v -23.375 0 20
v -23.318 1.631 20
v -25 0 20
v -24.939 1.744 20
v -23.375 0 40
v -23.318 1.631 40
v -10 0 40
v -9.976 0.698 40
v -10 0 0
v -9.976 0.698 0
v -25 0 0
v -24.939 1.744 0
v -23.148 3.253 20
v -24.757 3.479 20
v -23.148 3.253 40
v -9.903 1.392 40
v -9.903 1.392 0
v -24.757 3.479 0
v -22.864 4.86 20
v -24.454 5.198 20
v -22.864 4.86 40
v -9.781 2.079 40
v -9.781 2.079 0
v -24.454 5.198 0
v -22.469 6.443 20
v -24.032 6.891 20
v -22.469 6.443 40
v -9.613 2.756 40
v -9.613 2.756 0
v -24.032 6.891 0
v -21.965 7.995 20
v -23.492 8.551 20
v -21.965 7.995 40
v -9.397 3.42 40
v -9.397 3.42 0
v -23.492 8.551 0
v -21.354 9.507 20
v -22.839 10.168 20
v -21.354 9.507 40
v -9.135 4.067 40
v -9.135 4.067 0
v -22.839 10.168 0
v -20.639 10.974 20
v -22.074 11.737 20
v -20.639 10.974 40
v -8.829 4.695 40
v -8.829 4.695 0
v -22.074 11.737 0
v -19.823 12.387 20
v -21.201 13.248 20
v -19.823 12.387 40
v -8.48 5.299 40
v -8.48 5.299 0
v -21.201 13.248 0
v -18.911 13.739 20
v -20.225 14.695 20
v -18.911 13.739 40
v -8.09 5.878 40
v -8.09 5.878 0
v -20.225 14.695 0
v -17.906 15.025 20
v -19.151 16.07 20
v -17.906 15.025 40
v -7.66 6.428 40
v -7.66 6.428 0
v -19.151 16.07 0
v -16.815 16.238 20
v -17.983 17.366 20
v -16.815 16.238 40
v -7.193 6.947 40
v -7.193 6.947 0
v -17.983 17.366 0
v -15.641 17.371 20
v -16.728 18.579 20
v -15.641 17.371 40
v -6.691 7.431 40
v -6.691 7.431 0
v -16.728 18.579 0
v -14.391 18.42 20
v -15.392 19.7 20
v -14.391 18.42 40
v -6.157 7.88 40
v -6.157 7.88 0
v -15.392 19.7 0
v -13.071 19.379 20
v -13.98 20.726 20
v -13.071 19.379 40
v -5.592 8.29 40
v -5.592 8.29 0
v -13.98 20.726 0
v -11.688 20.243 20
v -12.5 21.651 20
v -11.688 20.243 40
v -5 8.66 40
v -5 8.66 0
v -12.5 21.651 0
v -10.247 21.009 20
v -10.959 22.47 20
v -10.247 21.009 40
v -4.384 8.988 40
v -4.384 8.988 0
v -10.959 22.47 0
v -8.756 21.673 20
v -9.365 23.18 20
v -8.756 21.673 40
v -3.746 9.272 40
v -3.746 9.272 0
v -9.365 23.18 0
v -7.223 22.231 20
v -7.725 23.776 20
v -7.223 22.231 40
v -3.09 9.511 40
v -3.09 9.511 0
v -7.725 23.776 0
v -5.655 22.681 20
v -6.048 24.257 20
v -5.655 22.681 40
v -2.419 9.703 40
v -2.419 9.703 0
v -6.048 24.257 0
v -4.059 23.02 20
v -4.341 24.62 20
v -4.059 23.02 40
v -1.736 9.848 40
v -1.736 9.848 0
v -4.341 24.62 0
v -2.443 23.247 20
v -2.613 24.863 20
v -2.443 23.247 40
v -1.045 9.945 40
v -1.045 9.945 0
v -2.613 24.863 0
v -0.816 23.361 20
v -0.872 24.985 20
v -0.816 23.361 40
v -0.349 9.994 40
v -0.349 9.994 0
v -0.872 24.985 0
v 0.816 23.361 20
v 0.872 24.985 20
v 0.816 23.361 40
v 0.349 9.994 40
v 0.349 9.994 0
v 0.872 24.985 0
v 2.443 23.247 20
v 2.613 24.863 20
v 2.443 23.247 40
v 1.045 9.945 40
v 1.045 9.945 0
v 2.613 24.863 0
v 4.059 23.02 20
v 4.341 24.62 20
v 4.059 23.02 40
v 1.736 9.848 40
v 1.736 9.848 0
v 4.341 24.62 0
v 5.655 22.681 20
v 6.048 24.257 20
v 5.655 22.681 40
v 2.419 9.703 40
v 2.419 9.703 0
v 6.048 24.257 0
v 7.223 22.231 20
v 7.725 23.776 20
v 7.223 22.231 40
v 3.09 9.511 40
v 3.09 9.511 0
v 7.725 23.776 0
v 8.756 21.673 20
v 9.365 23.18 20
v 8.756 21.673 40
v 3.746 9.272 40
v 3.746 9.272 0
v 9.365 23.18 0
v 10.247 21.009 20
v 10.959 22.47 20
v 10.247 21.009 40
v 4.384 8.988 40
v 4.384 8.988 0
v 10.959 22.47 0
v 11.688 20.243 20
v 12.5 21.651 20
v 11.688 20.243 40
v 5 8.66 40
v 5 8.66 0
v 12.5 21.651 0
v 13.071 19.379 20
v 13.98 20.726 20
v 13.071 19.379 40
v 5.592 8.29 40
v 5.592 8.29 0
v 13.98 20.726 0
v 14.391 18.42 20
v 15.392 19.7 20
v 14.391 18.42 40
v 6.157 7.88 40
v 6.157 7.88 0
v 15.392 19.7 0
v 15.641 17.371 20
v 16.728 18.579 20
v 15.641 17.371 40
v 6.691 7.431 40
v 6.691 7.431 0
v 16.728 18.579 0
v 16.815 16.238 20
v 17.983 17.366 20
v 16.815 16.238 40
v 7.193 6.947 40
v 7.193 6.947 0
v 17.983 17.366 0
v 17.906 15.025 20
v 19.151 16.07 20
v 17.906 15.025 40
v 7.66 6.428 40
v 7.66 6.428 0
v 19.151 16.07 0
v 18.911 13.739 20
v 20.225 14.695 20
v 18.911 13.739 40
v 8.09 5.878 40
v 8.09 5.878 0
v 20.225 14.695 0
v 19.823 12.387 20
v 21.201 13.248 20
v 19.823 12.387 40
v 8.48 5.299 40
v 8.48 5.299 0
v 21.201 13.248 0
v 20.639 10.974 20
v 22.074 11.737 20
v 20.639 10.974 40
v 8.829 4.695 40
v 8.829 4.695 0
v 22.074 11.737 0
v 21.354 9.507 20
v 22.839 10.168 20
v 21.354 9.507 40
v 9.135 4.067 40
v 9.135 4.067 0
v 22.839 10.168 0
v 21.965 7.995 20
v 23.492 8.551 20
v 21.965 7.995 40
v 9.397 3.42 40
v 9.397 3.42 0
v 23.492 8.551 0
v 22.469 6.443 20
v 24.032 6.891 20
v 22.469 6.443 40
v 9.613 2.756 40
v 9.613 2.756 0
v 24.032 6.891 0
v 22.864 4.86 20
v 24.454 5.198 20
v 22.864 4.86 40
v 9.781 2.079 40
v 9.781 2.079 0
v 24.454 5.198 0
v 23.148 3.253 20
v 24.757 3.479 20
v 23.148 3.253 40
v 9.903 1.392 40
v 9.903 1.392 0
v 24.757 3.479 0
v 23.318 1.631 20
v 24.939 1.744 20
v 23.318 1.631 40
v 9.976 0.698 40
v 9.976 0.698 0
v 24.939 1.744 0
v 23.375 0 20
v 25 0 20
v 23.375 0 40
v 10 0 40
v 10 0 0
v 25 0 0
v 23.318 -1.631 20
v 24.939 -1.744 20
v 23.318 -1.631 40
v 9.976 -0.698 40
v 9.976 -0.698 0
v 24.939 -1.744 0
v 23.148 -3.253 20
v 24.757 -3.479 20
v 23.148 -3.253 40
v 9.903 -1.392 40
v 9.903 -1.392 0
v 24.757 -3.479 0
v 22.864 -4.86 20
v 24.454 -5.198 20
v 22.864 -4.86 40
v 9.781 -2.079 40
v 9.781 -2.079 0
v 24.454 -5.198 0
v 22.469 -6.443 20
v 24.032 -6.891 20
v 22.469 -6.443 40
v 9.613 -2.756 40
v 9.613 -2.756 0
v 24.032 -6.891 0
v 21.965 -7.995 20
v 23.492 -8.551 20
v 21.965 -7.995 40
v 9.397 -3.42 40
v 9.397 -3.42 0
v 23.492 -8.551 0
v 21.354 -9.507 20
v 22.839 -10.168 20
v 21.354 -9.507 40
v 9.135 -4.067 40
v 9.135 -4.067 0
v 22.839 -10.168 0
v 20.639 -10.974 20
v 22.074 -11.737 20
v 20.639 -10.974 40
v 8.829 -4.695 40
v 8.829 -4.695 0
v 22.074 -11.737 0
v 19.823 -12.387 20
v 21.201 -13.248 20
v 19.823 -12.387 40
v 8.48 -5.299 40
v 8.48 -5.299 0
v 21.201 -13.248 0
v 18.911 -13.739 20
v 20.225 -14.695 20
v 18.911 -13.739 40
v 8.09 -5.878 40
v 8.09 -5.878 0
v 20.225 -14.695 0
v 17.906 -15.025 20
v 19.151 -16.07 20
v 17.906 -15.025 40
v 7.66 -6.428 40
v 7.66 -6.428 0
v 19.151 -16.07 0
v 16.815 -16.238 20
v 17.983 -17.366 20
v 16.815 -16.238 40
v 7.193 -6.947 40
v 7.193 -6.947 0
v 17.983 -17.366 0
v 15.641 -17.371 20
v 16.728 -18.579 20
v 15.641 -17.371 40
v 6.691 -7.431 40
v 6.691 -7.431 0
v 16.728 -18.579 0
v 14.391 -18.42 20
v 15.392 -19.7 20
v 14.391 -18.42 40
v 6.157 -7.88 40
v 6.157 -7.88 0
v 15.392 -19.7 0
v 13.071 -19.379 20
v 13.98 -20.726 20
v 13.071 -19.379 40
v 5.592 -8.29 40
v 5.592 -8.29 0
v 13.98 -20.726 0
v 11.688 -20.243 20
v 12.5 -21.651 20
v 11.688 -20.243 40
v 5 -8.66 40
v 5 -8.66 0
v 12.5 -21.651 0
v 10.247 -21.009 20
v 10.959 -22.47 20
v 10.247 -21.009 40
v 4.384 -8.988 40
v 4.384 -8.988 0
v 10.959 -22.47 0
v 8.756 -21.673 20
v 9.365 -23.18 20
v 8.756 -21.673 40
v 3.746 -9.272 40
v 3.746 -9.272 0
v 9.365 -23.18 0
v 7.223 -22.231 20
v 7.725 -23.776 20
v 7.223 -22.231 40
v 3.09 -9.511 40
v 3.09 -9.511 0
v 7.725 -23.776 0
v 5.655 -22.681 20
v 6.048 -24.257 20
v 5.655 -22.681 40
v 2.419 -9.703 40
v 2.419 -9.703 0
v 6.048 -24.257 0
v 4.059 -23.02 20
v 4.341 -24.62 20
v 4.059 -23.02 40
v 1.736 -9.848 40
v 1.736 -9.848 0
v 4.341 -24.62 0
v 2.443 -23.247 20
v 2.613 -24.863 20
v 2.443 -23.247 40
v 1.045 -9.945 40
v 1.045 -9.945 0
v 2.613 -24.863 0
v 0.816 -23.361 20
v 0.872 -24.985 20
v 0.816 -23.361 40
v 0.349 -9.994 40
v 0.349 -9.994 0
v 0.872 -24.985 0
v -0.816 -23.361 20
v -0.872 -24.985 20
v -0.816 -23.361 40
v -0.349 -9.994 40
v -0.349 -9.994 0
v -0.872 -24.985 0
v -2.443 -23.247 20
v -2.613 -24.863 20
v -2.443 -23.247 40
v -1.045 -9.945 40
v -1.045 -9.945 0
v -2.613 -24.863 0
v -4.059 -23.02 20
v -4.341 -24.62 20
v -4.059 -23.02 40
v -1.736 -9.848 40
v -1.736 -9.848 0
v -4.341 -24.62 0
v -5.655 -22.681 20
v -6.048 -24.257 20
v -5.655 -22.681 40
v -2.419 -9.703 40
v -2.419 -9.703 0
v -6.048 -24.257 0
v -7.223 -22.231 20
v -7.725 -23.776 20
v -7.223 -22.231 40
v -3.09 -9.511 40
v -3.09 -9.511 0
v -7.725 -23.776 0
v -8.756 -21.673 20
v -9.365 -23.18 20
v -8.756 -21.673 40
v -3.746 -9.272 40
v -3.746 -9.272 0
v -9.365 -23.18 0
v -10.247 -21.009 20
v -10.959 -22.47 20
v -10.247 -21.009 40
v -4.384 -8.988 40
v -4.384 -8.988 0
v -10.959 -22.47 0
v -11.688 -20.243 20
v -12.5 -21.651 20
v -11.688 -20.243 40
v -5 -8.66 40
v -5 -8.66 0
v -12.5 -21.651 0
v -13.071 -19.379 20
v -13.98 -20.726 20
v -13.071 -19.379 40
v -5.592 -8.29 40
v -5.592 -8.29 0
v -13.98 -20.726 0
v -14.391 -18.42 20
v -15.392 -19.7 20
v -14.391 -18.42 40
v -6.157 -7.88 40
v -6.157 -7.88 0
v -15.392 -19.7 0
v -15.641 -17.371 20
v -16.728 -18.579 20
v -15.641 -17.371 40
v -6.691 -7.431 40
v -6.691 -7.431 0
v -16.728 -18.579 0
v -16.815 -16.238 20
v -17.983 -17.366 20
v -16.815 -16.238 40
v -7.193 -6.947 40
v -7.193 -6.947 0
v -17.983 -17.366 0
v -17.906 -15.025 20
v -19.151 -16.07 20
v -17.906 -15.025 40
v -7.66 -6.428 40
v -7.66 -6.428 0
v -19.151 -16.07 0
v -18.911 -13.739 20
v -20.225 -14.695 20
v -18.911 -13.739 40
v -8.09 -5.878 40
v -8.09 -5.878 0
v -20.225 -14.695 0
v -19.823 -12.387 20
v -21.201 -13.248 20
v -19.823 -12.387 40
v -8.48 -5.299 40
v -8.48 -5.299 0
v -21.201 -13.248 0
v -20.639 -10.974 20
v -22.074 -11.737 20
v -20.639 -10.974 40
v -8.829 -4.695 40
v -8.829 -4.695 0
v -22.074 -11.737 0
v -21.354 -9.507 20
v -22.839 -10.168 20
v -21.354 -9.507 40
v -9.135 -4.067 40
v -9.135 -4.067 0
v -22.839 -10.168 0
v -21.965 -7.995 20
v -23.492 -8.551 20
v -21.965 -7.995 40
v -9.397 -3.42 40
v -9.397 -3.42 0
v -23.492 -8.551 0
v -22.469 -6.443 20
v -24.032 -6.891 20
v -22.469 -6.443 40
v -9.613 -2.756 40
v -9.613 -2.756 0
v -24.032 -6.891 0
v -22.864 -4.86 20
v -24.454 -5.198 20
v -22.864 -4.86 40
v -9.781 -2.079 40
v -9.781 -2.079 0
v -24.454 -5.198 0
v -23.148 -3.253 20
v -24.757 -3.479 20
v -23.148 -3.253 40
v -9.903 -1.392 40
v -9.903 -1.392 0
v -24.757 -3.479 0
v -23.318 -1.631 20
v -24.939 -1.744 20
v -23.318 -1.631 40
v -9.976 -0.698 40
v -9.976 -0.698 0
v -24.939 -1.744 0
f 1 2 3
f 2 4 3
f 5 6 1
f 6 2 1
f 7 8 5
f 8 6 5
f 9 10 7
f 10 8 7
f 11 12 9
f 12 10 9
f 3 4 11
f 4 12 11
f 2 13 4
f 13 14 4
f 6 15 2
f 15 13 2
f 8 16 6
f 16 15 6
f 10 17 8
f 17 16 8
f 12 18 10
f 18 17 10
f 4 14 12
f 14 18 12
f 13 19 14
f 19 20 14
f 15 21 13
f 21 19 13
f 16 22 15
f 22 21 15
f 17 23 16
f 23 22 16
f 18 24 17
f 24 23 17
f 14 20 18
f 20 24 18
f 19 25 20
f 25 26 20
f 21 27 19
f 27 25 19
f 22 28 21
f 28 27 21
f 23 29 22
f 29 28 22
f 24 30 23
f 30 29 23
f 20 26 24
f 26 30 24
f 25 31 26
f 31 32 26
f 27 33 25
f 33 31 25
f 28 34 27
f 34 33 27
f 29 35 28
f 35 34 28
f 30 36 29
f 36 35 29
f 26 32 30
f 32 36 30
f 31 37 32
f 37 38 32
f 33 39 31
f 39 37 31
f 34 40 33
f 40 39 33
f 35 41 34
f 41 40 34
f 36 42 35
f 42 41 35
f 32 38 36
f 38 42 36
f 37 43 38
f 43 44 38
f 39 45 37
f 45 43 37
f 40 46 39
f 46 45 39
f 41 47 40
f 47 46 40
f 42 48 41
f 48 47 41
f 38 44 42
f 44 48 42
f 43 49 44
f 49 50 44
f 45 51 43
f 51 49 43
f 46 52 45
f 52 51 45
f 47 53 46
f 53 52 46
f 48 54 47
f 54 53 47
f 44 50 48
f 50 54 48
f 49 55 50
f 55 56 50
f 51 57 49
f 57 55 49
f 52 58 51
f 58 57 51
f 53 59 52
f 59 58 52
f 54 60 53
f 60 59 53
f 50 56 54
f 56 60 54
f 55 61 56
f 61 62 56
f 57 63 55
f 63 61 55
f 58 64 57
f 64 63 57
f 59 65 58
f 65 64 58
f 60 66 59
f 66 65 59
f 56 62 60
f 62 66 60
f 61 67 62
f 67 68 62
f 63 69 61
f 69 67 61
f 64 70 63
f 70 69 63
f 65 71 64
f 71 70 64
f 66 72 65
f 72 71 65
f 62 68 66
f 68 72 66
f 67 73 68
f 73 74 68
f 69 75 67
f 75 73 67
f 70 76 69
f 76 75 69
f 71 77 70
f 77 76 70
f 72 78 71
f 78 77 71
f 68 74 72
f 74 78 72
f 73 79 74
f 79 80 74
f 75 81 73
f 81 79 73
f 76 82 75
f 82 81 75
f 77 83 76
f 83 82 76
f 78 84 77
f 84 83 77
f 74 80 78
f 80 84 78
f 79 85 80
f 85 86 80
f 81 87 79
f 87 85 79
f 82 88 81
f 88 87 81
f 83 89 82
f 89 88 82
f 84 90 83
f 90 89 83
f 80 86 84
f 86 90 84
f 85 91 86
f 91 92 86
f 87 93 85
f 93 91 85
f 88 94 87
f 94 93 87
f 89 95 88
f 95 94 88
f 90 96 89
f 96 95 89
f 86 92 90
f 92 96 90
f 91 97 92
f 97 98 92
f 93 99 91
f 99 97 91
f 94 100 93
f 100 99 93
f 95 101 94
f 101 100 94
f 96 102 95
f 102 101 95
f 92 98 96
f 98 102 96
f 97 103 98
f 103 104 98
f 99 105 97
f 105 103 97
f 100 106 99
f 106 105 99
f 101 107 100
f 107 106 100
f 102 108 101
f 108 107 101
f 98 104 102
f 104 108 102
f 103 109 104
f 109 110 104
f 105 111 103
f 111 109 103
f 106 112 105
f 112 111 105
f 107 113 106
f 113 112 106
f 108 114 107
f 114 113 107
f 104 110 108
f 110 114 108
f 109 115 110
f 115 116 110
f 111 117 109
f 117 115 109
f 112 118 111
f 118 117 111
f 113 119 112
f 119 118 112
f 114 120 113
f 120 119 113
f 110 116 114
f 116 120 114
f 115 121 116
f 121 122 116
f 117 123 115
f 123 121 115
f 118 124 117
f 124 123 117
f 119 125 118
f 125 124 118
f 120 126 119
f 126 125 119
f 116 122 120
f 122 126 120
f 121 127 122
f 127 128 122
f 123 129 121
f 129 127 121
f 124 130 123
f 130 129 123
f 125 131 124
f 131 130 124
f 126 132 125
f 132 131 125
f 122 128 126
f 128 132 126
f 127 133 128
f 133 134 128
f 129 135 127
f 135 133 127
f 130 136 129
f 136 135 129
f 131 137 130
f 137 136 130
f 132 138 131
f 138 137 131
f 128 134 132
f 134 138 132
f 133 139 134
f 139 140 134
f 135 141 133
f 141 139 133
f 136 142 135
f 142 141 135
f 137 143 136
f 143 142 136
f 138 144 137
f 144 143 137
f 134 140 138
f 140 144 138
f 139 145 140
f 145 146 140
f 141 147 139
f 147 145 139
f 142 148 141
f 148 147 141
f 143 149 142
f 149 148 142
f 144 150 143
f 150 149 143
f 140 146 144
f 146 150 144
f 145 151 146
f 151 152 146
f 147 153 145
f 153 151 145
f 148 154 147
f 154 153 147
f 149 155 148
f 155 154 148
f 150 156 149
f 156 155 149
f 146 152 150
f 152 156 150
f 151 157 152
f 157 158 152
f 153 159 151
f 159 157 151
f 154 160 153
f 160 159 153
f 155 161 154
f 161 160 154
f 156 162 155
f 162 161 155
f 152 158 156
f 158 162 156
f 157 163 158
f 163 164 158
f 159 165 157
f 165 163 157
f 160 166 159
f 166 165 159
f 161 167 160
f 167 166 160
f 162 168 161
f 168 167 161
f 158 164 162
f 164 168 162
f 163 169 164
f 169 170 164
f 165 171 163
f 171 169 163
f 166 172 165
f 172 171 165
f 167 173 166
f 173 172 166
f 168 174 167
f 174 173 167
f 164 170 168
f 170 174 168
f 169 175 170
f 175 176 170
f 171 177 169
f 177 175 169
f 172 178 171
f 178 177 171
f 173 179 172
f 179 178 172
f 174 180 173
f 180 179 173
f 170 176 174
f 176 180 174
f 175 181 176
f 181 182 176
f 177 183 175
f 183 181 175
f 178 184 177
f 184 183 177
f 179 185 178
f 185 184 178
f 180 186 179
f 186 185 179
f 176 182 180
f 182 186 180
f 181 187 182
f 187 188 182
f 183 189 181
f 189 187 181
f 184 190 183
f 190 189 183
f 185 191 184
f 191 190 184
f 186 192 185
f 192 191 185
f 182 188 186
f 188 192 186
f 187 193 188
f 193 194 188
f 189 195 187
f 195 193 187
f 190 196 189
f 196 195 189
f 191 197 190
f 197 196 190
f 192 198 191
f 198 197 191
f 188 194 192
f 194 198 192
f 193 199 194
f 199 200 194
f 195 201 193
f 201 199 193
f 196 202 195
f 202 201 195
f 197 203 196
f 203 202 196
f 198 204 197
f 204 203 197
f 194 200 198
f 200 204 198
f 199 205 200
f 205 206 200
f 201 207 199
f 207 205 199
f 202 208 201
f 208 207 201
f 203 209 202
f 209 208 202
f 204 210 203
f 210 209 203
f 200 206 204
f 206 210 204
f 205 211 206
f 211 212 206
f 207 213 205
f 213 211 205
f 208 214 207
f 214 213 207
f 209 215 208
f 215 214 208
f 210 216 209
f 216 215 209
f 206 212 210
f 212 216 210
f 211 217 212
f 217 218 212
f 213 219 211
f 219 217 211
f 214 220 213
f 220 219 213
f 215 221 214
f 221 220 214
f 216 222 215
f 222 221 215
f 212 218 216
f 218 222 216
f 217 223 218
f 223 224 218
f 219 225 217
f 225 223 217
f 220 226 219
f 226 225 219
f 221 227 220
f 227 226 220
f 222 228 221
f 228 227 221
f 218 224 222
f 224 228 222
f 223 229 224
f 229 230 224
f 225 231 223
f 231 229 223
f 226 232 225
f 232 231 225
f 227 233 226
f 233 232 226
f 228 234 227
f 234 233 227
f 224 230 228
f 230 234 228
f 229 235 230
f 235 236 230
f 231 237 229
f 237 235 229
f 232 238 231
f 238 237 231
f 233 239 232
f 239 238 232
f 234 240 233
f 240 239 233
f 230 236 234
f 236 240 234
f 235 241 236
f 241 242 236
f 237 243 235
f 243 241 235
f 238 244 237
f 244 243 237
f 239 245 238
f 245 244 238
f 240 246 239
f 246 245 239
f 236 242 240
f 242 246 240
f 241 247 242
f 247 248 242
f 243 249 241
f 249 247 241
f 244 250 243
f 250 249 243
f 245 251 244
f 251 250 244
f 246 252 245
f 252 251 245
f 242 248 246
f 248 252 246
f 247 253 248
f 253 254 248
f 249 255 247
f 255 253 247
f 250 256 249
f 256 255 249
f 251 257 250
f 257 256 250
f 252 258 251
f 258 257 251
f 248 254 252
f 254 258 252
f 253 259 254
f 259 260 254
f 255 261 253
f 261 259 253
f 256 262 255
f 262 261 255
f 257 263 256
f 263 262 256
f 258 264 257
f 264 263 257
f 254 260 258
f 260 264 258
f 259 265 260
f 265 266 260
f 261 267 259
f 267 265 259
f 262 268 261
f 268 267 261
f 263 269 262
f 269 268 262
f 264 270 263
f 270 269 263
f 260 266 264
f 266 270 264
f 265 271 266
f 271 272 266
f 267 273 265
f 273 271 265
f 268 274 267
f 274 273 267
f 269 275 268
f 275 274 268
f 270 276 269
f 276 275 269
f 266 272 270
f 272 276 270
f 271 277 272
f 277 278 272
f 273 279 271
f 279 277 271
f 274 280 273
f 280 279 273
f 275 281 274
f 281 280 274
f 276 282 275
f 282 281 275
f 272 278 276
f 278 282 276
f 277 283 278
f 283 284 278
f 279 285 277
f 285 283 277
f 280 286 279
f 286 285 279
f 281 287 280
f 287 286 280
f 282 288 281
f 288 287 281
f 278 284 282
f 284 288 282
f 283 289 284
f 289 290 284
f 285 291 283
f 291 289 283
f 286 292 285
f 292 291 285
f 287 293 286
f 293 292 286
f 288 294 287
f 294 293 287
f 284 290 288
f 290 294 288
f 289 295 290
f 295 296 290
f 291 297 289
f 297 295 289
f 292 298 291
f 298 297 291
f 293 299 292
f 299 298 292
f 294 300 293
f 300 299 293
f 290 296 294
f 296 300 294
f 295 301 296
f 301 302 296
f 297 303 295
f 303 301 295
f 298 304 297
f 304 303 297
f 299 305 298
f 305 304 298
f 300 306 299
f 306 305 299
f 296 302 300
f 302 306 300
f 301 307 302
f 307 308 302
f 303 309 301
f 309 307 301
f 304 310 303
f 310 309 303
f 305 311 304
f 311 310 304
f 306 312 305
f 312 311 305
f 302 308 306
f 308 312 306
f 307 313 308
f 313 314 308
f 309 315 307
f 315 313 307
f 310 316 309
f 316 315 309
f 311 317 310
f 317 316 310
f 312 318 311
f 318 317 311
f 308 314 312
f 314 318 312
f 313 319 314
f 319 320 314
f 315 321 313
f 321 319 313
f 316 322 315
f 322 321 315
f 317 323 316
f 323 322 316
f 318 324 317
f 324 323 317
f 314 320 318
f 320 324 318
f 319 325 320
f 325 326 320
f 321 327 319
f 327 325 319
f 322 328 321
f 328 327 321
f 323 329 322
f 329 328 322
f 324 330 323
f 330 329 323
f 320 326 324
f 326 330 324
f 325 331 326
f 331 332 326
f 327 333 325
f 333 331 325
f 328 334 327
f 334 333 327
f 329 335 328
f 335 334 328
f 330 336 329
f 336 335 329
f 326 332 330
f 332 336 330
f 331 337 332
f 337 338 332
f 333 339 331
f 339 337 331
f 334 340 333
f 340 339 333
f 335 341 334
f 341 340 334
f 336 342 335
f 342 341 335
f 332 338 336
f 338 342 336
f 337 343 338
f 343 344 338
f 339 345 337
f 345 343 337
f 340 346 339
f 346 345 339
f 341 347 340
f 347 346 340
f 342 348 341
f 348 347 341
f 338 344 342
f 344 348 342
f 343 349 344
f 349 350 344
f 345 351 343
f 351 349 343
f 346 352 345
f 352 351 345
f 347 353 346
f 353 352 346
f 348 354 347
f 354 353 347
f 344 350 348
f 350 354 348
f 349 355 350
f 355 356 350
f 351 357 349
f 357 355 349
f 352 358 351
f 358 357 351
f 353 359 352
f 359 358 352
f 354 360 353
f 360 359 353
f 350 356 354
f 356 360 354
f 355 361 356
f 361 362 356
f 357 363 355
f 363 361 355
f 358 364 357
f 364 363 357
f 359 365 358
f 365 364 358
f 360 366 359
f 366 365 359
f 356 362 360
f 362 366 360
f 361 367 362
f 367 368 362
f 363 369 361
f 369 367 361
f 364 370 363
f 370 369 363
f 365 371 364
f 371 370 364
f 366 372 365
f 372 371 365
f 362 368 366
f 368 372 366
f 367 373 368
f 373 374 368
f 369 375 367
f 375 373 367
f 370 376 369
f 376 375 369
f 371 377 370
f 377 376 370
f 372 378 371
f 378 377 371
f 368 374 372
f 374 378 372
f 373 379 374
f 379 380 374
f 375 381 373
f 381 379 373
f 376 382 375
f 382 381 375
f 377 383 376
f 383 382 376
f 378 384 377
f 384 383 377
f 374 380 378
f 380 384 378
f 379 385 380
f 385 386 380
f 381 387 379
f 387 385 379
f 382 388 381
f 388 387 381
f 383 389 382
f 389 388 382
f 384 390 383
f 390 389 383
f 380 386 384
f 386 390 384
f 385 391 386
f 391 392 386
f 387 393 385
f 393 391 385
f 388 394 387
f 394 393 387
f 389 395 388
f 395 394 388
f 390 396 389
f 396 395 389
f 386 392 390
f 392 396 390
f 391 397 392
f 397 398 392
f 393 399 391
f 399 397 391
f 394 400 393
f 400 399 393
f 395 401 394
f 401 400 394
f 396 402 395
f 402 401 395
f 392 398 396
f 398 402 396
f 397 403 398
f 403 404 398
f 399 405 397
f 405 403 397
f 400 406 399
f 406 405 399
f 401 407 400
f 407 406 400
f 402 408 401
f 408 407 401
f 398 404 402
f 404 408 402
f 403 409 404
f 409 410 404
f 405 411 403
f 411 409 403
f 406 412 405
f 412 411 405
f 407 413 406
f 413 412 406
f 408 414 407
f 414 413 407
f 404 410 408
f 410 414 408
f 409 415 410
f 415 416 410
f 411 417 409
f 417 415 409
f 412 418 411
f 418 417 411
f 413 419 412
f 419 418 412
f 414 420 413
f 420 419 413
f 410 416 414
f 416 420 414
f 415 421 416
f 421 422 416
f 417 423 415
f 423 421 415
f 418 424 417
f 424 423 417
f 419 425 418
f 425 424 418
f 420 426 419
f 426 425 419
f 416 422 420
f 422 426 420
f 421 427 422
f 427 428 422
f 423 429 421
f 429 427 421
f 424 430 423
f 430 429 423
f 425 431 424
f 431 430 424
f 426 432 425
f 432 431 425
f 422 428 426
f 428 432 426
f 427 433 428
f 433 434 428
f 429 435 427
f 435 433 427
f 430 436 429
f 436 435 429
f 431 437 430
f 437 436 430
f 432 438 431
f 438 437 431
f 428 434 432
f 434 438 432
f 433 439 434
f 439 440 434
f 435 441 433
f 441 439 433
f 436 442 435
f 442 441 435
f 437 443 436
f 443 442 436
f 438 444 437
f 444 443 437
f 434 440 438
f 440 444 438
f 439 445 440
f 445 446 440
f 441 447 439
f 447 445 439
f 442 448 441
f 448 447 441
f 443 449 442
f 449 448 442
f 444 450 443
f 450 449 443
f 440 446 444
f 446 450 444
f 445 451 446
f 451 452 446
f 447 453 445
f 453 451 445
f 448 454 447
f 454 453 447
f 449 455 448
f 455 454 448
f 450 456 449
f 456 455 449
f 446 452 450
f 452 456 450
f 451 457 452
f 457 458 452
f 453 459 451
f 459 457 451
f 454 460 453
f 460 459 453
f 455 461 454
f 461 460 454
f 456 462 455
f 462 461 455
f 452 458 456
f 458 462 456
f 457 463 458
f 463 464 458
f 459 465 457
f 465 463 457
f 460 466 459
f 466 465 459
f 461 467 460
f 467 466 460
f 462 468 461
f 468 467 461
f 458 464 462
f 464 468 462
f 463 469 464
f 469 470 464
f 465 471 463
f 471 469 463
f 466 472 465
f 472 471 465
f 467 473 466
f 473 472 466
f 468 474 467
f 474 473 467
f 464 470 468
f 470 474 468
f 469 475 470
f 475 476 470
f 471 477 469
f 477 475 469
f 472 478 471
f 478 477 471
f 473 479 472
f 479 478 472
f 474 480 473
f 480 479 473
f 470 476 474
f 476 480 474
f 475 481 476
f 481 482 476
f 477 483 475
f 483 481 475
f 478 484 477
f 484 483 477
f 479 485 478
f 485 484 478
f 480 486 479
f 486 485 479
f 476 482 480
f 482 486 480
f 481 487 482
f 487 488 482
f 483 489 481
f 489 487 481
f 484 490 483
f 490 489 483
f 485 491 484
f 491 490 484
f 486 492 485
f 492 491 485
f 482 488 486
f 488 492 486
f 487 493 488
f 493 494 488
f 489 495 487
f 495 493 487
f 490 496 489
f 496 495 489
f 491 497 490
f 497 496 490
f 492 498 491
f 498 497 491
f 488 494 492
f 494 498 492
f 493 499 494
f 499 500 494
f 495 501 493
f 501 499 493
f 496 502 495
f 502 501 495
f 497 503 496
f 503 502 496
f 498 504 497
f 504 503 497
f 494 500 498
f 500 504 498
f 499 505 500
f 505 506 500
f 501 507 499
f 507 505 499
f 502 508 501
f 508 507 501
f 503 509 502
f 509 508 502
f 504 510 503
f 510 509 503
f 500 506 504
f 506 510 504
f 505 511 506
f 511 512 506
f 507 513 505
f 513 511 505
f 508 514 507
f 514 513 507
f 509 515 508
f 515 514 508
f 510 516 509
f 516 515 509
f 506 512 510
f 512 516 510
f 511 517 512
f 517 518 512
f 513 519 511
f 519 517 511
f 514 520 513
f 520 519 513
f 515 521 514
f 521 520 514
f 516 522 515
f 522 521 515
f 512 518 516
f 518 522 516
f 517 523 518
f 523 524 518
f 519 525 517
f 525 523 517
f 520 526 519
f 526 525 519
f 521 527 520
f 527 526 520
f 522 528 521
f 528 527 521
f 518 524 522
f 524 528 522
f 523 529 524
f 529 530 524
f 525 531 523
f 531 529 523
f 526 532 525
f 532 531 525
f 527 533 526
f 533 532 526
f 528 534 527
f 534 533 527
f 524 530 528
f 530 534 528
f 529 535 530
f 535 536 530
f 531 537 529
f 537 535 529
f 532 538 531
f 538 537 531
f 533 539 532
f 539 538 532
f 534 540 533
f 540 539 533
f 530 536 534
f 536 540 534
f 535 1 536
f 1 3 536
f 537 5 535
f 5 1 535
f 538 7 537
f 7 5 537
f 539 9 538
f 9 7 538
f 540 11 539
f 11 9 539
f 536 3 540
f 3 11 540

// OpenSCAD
// Hollow Radius of drifter
hr = 10;
// Outer diameter of bearing
od = 50;
// Inner diameter of bearing
id = 46.75;
// Drifter back thickness;
bt = 20;
// Drifter front thickness;
ft = 20;

// rotate_extrude() rotates a 2D shape around the Z axis. 
// Note that the 2D shape must be either completely on the 
// positive or negative side of the X axis.
color("red")
    rotate_extrude($fn = 90)
            polygon(points=[
                [hr,0],// donut hole radius
                [od/2,0],// Cam bearing OD radius
                [od/2,bt],// Drifter thickness
                [id/2,bt],// Cam bearing ID radius
                [id/2,bt+ft],// Drifter ID thickness
                [hr,bt+ft]
            ]);
